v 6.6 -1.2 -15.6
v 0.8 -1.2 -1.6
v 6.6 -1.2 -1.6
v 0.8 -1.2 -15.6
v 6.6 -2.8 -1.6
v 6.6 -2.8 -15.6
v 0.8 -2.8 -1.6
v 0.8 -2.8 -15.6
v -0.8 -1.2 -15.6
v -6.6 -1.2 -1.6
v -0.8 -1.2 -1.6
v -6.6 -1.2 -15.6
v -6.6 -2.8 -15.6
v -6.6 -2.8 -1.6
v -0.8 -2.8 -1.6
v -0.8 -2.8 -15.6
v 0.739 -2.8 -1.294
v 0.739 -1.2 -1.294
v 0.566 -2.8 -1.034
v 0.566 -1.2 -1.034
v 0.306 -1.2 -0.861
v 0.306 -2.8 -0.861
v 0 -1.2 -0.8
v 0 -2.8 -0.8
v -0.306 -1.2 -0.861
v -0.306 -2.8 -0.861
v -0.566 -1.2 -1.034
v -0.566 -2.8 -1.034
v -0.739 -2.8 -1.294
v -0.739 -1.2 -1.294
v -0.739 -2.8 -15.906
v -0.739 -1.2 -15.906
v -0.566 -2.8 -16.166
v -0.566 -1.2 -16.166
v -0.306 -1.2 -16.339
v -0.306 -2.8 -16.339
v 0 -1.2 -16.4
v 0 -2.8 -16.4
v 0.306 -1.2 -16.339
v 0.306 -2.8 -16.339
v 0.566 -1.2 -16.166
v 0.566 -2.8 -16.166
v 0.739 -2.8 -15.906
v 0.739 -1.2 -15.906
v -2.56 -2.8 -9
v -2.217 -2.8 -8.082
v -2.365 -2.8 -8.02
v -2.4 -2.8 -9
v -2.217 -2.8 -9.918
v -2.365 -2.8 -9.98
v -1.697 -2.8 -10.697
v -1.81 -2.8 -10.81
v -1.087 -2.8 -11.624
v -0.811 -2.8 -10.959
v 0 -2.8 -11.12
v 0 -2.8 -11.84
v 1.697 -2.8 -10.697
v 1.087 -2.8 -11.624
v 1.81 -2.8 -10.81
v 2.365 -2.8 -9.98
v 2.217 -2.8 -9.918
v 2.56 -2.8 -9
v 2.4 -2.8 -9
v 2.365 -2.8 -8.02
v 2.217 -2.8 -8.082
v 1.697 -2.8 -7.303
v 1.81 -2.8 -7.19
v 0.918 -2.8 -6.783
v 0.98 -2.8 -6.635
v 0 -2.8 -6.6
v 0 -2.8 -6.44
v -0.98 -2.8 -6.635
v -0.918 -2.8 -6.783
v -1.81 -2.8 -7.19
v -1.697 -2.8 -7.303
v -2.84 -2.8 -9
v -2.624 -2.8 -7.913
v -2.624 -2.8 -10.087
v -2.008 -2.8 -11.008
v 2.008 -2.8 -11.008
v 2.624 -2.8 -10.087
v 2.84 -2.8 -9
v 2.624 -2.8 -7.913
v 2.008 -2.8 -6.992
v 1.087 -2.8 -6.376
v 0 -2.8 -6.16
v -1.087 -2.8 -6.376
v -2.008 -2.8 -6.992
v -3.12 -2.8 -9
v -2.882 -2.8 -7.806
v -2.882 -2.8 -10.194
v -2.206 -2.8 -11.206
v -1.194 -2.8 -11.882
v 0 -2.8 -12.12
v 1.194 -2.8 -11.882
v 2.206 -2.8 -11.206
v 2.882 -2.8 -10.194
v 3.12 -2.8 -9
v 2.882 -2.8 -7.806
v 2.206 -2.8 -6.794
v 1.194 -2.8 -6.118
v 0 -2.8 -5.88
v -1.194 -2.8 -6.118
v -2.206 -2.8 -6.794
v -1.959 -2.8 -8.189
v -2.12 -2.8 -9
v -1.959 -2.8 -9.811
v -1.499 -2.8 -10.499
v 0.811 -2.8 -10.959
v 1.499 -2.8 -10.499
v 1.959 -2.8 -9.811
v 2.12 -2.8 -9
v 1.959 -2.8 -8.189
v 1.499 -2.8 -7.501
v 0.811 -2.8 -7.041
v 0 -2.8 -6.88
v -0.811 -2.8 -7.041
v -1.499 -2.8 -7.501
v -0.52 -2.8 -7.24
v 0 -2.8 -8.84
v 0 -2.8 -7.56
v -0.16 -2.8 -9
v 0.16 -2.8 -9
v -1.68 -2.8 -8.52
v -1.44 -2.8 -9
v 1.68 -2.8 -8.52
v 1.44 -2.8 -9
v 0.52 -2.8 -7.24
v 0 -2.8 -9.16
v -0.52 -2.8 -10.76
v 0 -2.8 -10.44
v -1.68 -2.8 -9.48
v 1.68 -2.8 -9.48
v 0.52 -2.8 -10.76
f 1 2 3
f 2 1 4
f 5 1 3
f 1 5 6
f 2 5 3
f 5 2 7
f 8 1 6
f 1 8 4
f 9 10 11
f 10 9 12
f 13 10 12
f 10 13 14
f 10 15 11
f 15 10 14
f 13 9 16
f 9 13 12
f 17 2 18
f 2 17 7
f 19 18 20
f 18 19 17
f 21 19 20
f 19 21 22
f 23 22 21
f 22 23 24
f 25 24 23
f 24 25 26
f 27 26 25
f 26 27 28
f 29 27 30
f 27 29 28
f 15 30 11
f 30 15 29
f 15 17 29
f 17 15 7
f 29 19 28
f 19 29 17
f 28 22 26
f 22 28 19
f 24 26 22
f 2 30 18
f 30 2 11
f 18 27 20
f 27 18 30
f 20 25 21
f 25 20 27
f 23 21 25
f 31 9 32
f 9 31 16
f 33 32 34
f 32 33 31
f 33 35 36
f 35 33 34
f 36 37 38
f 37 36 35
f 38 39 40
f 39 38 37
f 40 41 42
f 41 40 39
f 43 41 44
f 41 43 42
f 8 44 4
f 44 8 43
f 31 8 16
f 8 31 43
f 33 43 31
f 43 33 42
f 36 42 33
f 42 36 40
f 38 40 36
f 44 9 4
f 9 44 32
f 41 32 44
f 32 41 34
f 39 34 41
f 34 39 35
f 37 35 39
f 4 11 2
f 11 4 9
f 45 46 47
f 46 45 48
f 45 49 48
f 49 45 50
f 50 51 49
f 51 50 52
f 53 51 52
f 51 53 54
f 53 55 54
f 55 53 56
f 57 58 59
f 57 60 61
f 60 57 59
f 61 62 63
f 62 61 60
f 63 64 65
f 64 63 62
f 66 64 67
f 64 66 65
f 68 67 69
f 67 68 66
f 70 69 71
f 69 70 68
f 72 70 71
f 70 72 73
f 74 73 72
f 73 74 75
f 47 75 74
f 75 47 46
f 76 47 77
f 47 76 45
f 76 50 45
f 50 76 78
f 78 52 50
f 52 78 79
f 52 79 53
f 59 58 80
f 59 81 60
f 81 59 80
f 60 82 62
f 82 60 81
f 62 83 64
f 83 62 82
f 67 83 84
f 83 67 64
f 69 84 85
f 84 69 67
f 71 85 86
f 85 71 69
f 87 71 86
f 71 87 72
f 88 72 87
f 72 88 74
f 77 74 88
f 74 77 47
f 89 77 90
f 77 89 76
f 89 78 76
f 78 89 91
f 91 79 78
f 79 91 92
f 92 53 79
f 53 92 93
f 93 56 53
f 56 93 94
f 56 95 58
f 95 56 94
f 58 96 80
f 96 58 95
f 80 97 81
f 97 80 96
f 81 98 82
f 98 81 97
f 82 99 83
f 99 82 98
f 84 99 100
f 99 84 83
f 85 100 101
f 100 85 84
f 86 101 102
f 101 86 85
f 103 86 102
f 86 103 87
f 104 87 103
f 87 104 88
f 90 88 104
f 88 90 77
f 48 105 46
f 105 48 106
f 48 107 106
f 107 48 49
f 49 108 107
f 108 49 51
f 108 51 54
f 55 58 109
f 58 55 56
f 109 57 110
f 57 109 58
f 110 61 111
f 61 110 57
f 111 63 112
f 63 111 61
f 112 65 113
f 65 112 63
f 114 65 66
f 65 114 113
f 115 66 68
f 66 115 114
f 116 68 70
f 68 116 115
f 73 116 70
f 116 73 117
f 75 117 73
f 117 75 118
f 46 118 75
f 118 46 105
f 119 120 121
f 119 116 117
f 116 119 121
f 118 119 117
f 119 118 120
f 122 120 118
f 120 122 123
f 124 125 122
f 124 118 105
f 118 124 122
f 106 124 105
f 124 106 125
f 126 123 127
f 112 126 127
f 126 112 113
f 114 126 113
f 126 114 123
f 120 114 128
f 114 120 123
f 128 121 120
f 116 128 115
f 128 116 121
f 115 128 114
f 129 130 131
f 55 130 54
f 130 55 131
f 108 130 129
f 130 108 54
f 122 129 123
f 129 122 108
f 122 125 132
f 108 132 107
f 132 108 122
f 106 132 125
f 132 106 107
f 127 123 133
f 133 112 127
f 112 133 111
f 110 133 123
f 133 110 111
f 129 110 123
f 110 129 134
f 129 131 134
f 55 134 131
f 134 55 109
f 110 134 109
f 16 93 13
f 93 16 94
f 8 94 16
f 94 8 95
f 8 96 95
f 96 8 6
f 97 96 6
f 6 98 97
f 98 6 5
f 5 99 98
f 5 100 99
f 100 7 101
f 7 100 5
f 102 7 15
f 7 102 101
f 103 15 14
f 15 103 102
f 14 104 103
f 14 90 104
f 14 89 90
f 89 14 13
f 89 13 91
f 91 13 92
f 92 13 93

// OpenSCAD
// file: ../p/2-4edge.scad
use <../lib.scad>
function ldraw_lib__2_4edge() = [
// 0 Circle 0.5
// 0 Name: 2-4edge.dat
// 0 Author: James Jessiman
// 0 !LDRAW_ORG Primitive UPDATE 2017-01
// 0 !LICENSE Licensed under CC BY 4.0 : see CAreadme.txt
// 
// 0 BFC CERTIFY CCW
  [0,"BFC","CERTIFY"],
  [0,"BFC","CCW"],
// 
// 0 !HISTORY 2007-06-24 [PTadmin] Header formatted for Contributor Agreement
// 0 !HISTORY 2008-07-01 [PTadmin] Official Update 2008-01
// 0 !HISTORY 2017-01-15 [Steffen] BFCed
// 0 !HISTORY 2017-12-30 [PTadmin] Official Update 2017-01
// 
// 
// 2 24 1 0 0 0.9239 0 0.3827
  [2,24,1,0,0,0.9239,0,0.3827],
// 2 24 0.9239 0 0.3827 0.7071 0 0.7071
  [2,24,0.9239,0,0.3827,0.7071,0,0.7071],
// 2 24 0.7071 0 0.7071 0.3827 0 0.9239
  [2,24,0.7071,0,0.7071,0.3827,0,0.9239],
// 2 24 0.3827 0 0.9239 0 0 1
  [2,24,0.3827,0,0.9239,0,0,1],
// 2 24 0 0 1 -0.3827 0 0.9239
  [2,24,0,0,1,-0.3827,0,0.9239],
// 2 24 -0.3827 0 0.9239 -0.7071 0 0.7071
  [2,24,-0.3827,0,0.9239,-0.7071,0,0.7071],
// 2 24 -0.7071 0 0.7071 -0.9239 0 0.3827
  [2,24,-0.7071,0,0.7071,-0.9239,0,0.3827],
// 2 24 -0.9239 0 0.3827 -1 0 0
  [2,24,-0.9239,0,0.3827,-1,0,0],
];
module ldraw_lib__2_4edge(step=0, col=false, unit=2/5, alt=false, line=0.2, solid=!$preview)
    makepoly(ldraw_lib__2_4edge(), step=step, col=col, unit=unit, alt=alt, line=line, solid=solid);
ldraw_lib__2_4edge(line=0.2);
// file: ../p/2-4cyli.scad
use <../lib.scad>
function ldraw_lib__2_4cyli() = [
// 0 Cylinder 0.5
// 0 Name: 2-4cyli.dat
// 0 Author: James Jessiman
// 0 !LDRAW_ORG Primitive UPDATE 2005-01
// 0 !LICENSE Licensed under CC BY 2.0 and CC BY 4.0 : see CAreadme.txt
// 
// 0 BFC CERTIFY CCW
  [0,"BFC","CERTIFY"],
  [0,"BFC","CCW"],
// 
// 0 !HISTORY 2002-03-23 [sbliss] Added BFC statement; compacted code
// 0 !HISTORY 2002-04-25 [PTadmin] Official Update 2002-02
// 0 !HISTORY 2004-12-11 [nielsk] Recreated using Primitive Generator, Edge lines fixed, BFC changed to CCW
// 0 !HISTORY 2005-12-28 [PTadmin] Official Update 2005-01
// 0 !HISTORY 2007-06-24 [PTadmin] Header formatted for Contributor Agreement
// 0 !HISTORY 2008-07-01 [PTadmin] Official Update 2008-01
// 
// 
// 4 16 .9239 1 .3827 .9239 0 .3827 1 0 0 1 1 0
  [4,16,.9239,1,.3827,.9239,0,.3827,1,0,0,1,1,0],
// 4 16 .7071 1 .7071 .7071 0 .7071 .9239 0 .3827 .9239 1 .3827
  [4,16,.7071,1,.7071,.7071,0,.7071,.9239,0,.3827,.9239,1,.3827],
// 4 16 .3827 1 .9239 .3827 0 .9239 .7071 0 .7071 .7071 1 .7071
  [4,16,.3827,1,.9239,.3827,0,.9239,.7071,0,.7071,.7071,1,.7071],
// 4 16 0 1 1 0 0 1 .3827 0 .9239 .3827 1 .9239
  [4,16,0,1,1,0,0,1,.3827,0,.9239,.3827,1,.9239],
// 4 16 -.3827 1 .9239 -.3827 0 .9239 0 0 1 0 1 1
  [4,16,-.3827,1,.9239,-.3827,0,.9239,0,0,1,0,1,1],
// 4 16 -.7071 1 .7071 -.7071 0 .7071 -.3827 0 .9239 -.3827 1 .9239
  [4,16,-.7071,1,.7071,-.7071,0,.7071,-.3827,0,.9239,-.3827,1,.9239],
// 4 16 -.9239 1 .3827 -.9239 0 .3827 -.7071 0 .7071 -.7071 1 .7071
  [4,16,-.9239,1,.3827,-.9239,0,.3827,-.7071,0,.7071,-.7071,1,.7071],
// 4 16 -1 1 0 -1 0 0 -.9239 0 .3827 -.9239 1 .3827
  [4,16,-1,1,0,-1,0,0,-.9239,0,.3827,-.9239,1,.3827],
// 5 24 1 1 0 1 0 0 1 1 -.4142 .9239 1 .3827
  [5,24,1,1,0,1,0,0,1,1,-.4142,.9239,1,.3827],
// 5 24 .9239 1 .3827 .9239 0 .3827 1 1 0 .7071 1 .7071
  [5,24,.9239,1,.3827,.9239,0,.3827,1,1,0,.7071,1,.7071],
// 5 24 .7071 1 .7071 .7071 0 .7071 .9239 1 .3827 .3827 1 .9239
  [5,24,.7071,1,.7071,.7071,0,.7071,.9239,1,.3827,.3827,1,.9239],
// 5 24 .3827 1 .9239 .3827 0 .9239 .7071 1 .7071 0 1 1
  [5,24,.3827,1,.9239,.3827,0,.9239,.7071,1,.7071,0,1,1],
// 5 24 0 1 1 0 0 1 .3827 1 .9239 -.3827 1 .9239
  [5,24,0,1,1,0,0,1,.3827,1,.9239,-.3827,1,.9239],
// 5 24 -.3827 1 .9239 -.3827 0 .9239 0 1 1 -.7071 1 .7071
  [5,24,-.3827,1,.9239,-.3827,0,.9239,0,1,1,-.7071,1,.7071],
// 5 24 -.7071 1 .7071 -.7071 0 .7071 -.3827 1 .9239 -.9239 1 .3827
  [5,24,-.7071,1,.7071,-.7071,0,.7071,-.3827,1,.9239,-.9239,1,.3827],
// 5 24 -.9239 1 .3827 -.9239 0 .3827 -.7071 1 .7071 -1 1 0
  [5,24,-.9239,1,.3827,-.9239,0,.3827,-.7071,1,.7071,-1,1,0],
// 5 24 -1 1 0 -1 0 0 -.9239 1 .3827 -1 1 -.4142
  [5,24,-1,1,0,-1,0,0,-.9239,1,.3827,-1,1,-.4142],
// 0
];
module ldraw_lib__2_4cyli(step=0, col=false, unit=2/5, alt=false, line=0.2, solid=!$preview)
    makepoly(ldraw_lib__2_4cyli(), step=step, col=col, unit=unit, alt=alt, line=line, solid=solid);
ldraw_lib__2_4cyli(line=0.2);
// file: ../p/box4-4a.scad
use <../lib.scad>
function ldraw_lib__box4_4a() = [
// 0 Box with 4 Faces without 4 Adjacent Edges
// 0 Name: box4-4a.dat
// 0 Author: Manfred Moolhuysen
// 0 !LDRAW_ORG Primitive UPDATE 2012-01
// 0 !LICENSE Licensed under CC BY 2.0 and CC BY 4.0 : see CAreadme.txt
// 
// 0 BFC CERTIFY CCW
  [0,"BFC","CERTIFY"],
  [0,"BFC","CCW"],
// 
// 0 !HISTORY 1998-07-15 [PTadmin] Official Update 1998-07
// 0 !HISTORY 2002-12-13 [hafhead] Made BFC compliant
// 0 !HISTORY 2003-03-12 [PTadmin] Official Update 2003-01
// 0 !HISTORY 2007-06-24 [PTadmin] Header formatted for Contributor Agreement
// 0 !HISTORY 2008-07-01 [PTadmin] Official Update 2008-01
// 0 !HISTORY 2012-02-16 [Philo] Changed to CCW
// 0 !HISTORY 2012-03-30 [PTadmin] Official Update 2012-01
// 
// 
// 2 24 1 1 1 -1 1 1
  [2,24,1,1,1,-1,1,1],
// 2 24 -1 1 1 -1 1 -1
  [2,24,-1,1,1,-1,1,-1],
// 2 24 1 1 -1 1 1 1
  [2,24,1,1,-1,1,1,1],
// 2 24 1 0 1 -1 0 1
  [2,24,1,0,1,-1,0,1],
// 2 24 -1 0 1 -1 0 -1
  [2,24,-1,0,1,-1,0,-1],
// 2 24 1 0 -1 1 0 1
  [2,24,1,0,-1,1,0,1],
// 2 24 1 0 1 1 1 1
  [2,24,1,0,1,1,1,1],
// 2 24 -1 0 1 -1 1 1
  [2,24,-1,0,1,-1,1,1],
// 4 16 1 1 -1 -1 1 -1 -1 1 1 1 1 1
  [4,16,1,1,-1,-1,1,-1,-1,1,1,1,1,1],
// 4 16 -1 1 1 -1 0 1 1 0 1 1 1 1
  [4,16,-1,1,1,-1,0,1,1,0,1,1,1,1],
// 4 16 -1 1 -1 -1 0 -1 -1 0 1 -1 1 1
  [4,16,-1,1,-1,-1,0,-1,-1,0,1,-1,1,1],
// 4 16 1 1 1 1 0 1 1 0 -1 1 1 -1
  [4,16,1,1,1,1,0,1,1,0,-1,1,1,-1],
];
module ldraw_lib__box4_4a(step=0, col=false, unit=2/5, alt=false, line=0.2, solid=!$preview)
    makepoly(ldraw_lib__box4_4a(), step=step, col=col, unit=unit, alt=alt, line=line, solid=solid);
ldraw_lib__box4_4a(line=0.2);
// file: ../p/2-4cylo.scad
use <../lib.scad>
use <2-4cyli.scad>
use <2-4edge.scad>
function ldraw_lib__2_4cylo() = [
// 0 Cylinder Open 0.5
// 0 Name: 2-4cylo.dat
// 0 Author: Max Martin Richter [MMR1988]
// 0 !LDRAW_ORG Primitive UPDATE 2010-03
// 0 !LICENSE Licensed under CC BY 4.0 : see CAreadme.txt
// 
// 0 BFC CERTIFY CCW
  [0,"BFC","CERTIFY"],
  [0,"BFC","CCW"],
// 
// 0 !HISTORY 2010-12-31 [PTadmin] Official Update 2010-03
// 
// 
// 1 16 0 0 0 1 0 0 0 1 0 0 0 1 2-4edge.dat
  [1,16,0,0,0,1,0,0,0,1,0,0,0,1, ldraw_lib__2_4edge()],
// 1 16 0 1 0 1 0 0 0 1 0 0 0 1 2-4edge.dat
  [1,16,0,1,0,1,0,0,0,1,0,0,0,1, ldraw_lib__2_4edge()],
// 1 16 0 0 0 1 0 0 0 1 0 0 0 1 2-4cyli.dat
  [1,16,0,0,0,1,0,0,0,1,0,0,0,1, ldraw_lib__2_4cyli()],
];
module ldraw_lib__2_4cylo(step=0, col=false, unit=2/5, alt=false, line=0.2, solid=!$preview)
    makepoly(ldraw_lib__2_4cylo(), step=step, col=col, unit=unit, alt=alt, line=line, solid=solid);
ldraw_lib__2_4cylo(line=0.2);
// file: ../p/2-4chrd.scad
use <../lib.scad>
function ldraw_lib__2_4chrd() = [
// 0 Chord 0.5
// 0 Name: 2-4chrd.dat
// 0 Author: Philippe Hurbain [Philo]
// 0 !LDRAW_ORG Primitive UPDATE 2014-01
// 0 !LICENSE Licensed under CC BY 4.0 : see CAreadme.txt
// 
// 0 BFC CERTIFY CCW
  [0,"BFC","CERTIFY"],
  [0,"BFC","CCW"],
// 
// 0 !HISTORY 2014-06-21 [PTadmin] Official Update 2014-01
// 
// 
// 4 16 0.9239 0 0.3827 -0.9239 0 0.3827 -1 0 0 1 0 0
  [4,16,0.9239,0,0.3827,-0.9239,0,0.3827,-1,0,0,1,0,0],
// 4 16 0.7071 0 0.7071 -0.7071 0 0.7071 -0.9239 0 0.3827 0.9239 0 0.3827
  [4,16,0.7071,0,0.7071,-0.7071,0,0.7071,-0.9239,0,0.3827,0.9239,0,0.3827],
// 4 16 0.3827 0 0.9239 -0.3827 0 0.9239 -0.7071 0 0.7071 0.7071 0 0.7071
  [4,16,0.3827,0,0.9239,-0.3827,0,0.9239,-0.7071,0,0.7071,0.7071,0,0.7071],
// 3 16 0 0 1 -0.3827 0 0.9239 0.3827 0 0.9239
  [3,16,0,0,1,-0.3827,0,0.9239,0.3827,0,0.9239],
];
module ldraw_lib__2_4chrd(step=0, col=false, unit=2/5, alt=false, line=0.2, solid=!$preview)
    makepoly(ldraw_lib__2_4chrd(), step=step, col=col, unit=unit, alt=alt, line=line, solid=solid);
ldraw_lib__2_4chrd(line=0.2);
// file: s/60601s01.scad
use <../../lib.scad>
use <../../p/2-4chrd.scad>
use <../../p/2-4cylo.scad>
use <../../p/box4-4a.scad>
function ldraw_lib__s__60601s01() = [
// 0 ~Glass for Window  1 x  2 x  2 without Front Surface
// 0 Name: s\60601s01.dat
// 0 Author: Ulrich Röder [UR]
// 0 !LDRAW_ORG Subpart UPDATE 2019-01
// 0 !LICENSE Licensed under CC BY 4.0 : see CAreadme.txt
// 
// 0 BFC CERTIFY CCW
  [0,"BFC","CERTIFY"],
  [0,"BFC","CCW"],
// 
// 0 !HISTORY 2019-06-28 [PTadmin] Official Update 2019-01
// 
// 
// 1 16 9.25 21.5 -7 0 0 7.25 17.5 0 0 0 4 0 box4-4a.dat
  [1,16,9.25,21.5,-7,0,0,7.25,17.5,0,0,0,4,0, ldraw_lib__box4_4a()],
// 1 16 -9.25 21.5 -7 0 0 -7.25 17.5 0 0 0 4 0 box4-4a.dat
  [1,16,-9.25,21.5,-7,0,0,-7.25,17.5,0,0,0,4,0, ldraw_lib__box4_4a()],
// 1 16 0 4 -7 2 0 0 0 0 -2 0 4 0 2-4cylo.dat
  [1,16,0,4,-7,2,0,0,0,0,-2,0,4,0, ldraw_lib__2_4cylo()],
// 1 16 0 4 -7 2 0 0 0 0 -2 0 1 0 2-4chrd.dat
  [1,16,0,4,-7,2,0,0,0,0,-2,0,1,0, ldraw_lib__2_4chrd()],
// 1 16 0 4 -3 -2 0 0 0 0 -2 0 -1 0 2-4chrd.dat
  [1,16,0,4,-3,-2,0,0,0,0,-2,0,-1,0, ldraw_lib__2_4chrd()],
// 1 16 0 39 -7 -2 0 0 0 0 2 0 4 0 2-4cylo.dat
  [1,16,0,39,-7,-2,0,0,0,0,2,0,4,0, ldraw_lib__2_4cylo()],
// 1 16 0 39 -7 -2 0 0 0 0 2 0 1 0 2-4chrd.dat
  [1,16,0,39,-7,-2,0,0,0,0,2,0,1,0, ldraw_lib__2_4chrd()],
// 1 16 0 39 -3 2 0 0 0 0 2 0 -1 0 2-4chrd.dat
  [1,16,0,39,-3,2,0,0,0,0,2,0,-1,0, ldraw_lib__2_4chrd()],
// 4 16 -2 4 -3 2 4 -3 2 39 -3 -2 39 -3
  [4,16,-2,4,-3,2,4,-3,2,39,-3,-2,39,-3],
// 2 24 2 4 -3 2 4 -7
  [2,24,2,4,-3,2,4,-7],
// 2 24 -2 4 -3 -2 4 -7
  [2,24,-2,4,-3,-2,4,-7],
// 2 24 2 39 -3 2 39 -7
  [2,24,2,39,-3,2,39,-7],
// 2 24 -2 39 -3 -2 39 -7
  [2,24,-2,39,-3,-2,39,-7],
];
module ldraw_lib__s__60601s01(step=0, col=false, unit=2/5, alt=false, line=0.2, solid=!$preview)
    makepoly(ldraw_lib__s__60601s01(), step=step, col=col, unit=unit, alt=alt, line=line, solid=solid);
ldraw_lib__s__60601s01(line=0.2);
// main file
use <../lib.scad>
use <s/60601s01.scad>
function ldraw_lib__60601p02() = [
// 0 Glass for Window  1 x  2 x  2 with Black and White St. John Ambulance Logo Pattern
// 0 Name: 60601p02.dat
// 0 Author: Gerald Lasser [GeraldLasser]
// 0 !LDRAW_ORG Part UPDATE 2020-01
// 0 !LICENSE Licensed under CC BY 4.0 : see CAreadme.txt
// 
// 0 BFC CERTIFY CCW
  [0,"BFC","CERTIFY"],
  [0,"BFC","CCW"],
// 
// 0 !KEYWORDS Bricklink 60601pb011, Dr. Who, Set 21304, Tardis
// 
// 0 !HISTORY 2020-06-28 [PTadmin] Official Update 2020-01
// 
// 
// 1 16 0 0 0 1 0 0 0 1 0 0 0 1 s\60601s01.dat
  [1,16,0,0,0,1,0,0,0,1,0,0,0,1, ldraw_lib__s__60601s01()],
// 
// 4 0 -6 22.5 -7 -5.543 20.204 -7 -5.913 20.051 -7 -6.4 22.5 -7
  [4,0,-6,22.5,-7,-5.543,20.204,-7,-5.913,20.051,-7,-6.4,22.5,-7],
// 4 0 -5.543 24.796 -7 -6 22.5 -7 -6.4 22.5 -7 -5.913 24.949 -7
  [4,0,-5.543,24.796,-7,-6,22.5,-7,-6.4,22.5,-7,-5.913,24.949,-7],
// 4 0 -4.243 26.743 -7 -5.543 24.796 -7 -5.913 24.949 -7 -4.525 27.025 -7
  [4,0,-4.243,26.743,-7,-5.543,24.796,-7,-5.913,24.949,-7,-4.525,27.025,-7],
// 4 15 -2.028 27.397 -7 -4.243 26.743 -7 -4.525 27.025 -7 -2.717 29.06 -7
  [4,15,-2.028,27.397,-7,-4.243,26.743,-7,-4.525,27.025,-7,-2.717,29.06,-7],
// 4 15 -2.028 27.397 -7 -2.717 29.06 -7 0 29.6 -7 0 27.8 -7
  [4,15,-2.028,27.397,-7,-2.717,29.06,-7,0,29.6,-7,0,27.8,-7],
// 3 15 4.243 26.743 -7 2.717 29.06 -7 4.525 27.025 -7
  [3,15,4.243,26.743,-7,2.717,29.06,-7,4.525,27.025,-7],
// 4 0 5.543 24.796 -7 4.243 26.743 -7 4.525 27.025 -7 5.913 24.949 -7
  [4,0,5.543,24.796,-7,4.243,26.743,-7,4.525,27.025,-7,5.913,24.949,-7],
// 4 0 6 22.5 -7 5.543 24.796 -7 5.913 24.949 -7 6.4 22.5 -7
  [4,0,6,22.5,-7,5.543,24.796,-7,5.913,24.949,-7,6.4,22.5,-7],
// 4 0 5.543 20.204 -7 6 22.5 -7 6.4 22.5 -7 5.913 20.051 -7
  [4,0,5.543,20.204,-7,6,22.5,-7,6.4,22.5,-7,5.913,20.051,-7],
// 4 0 4.243 18.257 -7 5.543 20.204 -7 5.913 20.051 -7 4.525 17.975 -7
  [4,0,4.243,18.257,-7,5.543,20.204,-7,5.913,20.051,-7,4.525,17.975,-7],
// 4 0 2.296 16.957 -7 4.243 18.257 -7 4.525 17.975 -7 2.449 16.587 -7
  [4,0,2.296,16.957,-7,4.243,18.257,-7,4.525,17.975,-7,2.449,16.587,-7],
// 4 0 0 16.5 -7 2.296 16.957 -7 2.449 16.587 -7 0 16.1 -7
  [4,0,0,16.5,-7,2.296,16.957,-7,2.449,16.587,-7,0,16.1,-7],
// 4 0 -2.296 16.957 -7 0 16.5 -7 0 16.1 -7 -2.449 16.587 -7
  [4,0,-2.296,16.957,-7,0,16.5,-7,0,16.1,-7,-2.449,16.587,-7],
// 4 0 -4.243 18.257 -7 -2.296 16.957 -7 -2.449 16.587 -7 -4.525 17.975 -7
  [4,0,-4.243,18.257,-7,-2.296,16.957,-7,-2.449,16.587,-7,-4.525,17.975,-7],
// 4 0 -5.543 20.204 -7 -4.243 18.257 -7 -4.525 17.975 -7 -5.913 20.051 -7
  [4,0,-5.543,20.204,-7,-4.243,18.257,-7,-4.525,17.975,-7,-5.913,20.051,-7],
// 4 15 -6.4 22.5 -7 -5.913 20.051 -7 -6.56 19.783 -7 -7.1 22.5 -7
  [4,15,-6.4,22.5,-7,-5.913,20.051,-7,-6.56,19.783,-7,-7.1,22.5,-7],
// 4 15 -5.913 24.949 -7 -6.4 22.5 -7 -7.1 22.5 -7 -6.56 25.217 -7
  [4,15,-5.913,24.949,-7,-6.4,22.5,-7,-7.1,22.5,-7,-6.56,25.217,-7],
// 4 15 -4.525 27.025 -7 -5.913 24.949 -7 -6.56 25.217 -7 -5.02 27.52 -7
  [4,15,-4.525,27.025,-7,-5.913,24.949,-7,-6.56,25.217,-7,-5.02,27.52,-7],
// 3 15 -4.525 27.025 -7 -5.02 27.52 -7 -2.717 29.06 -7
  [3,15,-4.525,27.025,-7,-5.02,27.52,-7,-2.717,29.06,-7],
// 3 15 4.525 27.025 -7 2.717 29.06 -7 5.02 27.52 -7
  [3,15,4.525,27.025,-7,2.717,29.06,-7,5.02,27.52,-7],
// 4 15 5.913 24.949 -7 4.525 27.025 -7 5.02 27.52 -7 6.56 25.217 -7
  [4,15,5.913,24.949,-7,4.525,27.025,-7,5.02,27.52,-7,6.56,25.217,-7],
// 4 15 6.4 22.5 -7 5.913 24.949 -7 6.56 25.217 -7 7.1 22.5 -7
  [4,15,6.4,22.5,-7,5.913,24.949,-7,6.56,25.217,-7,7.1,22.5,-7],
// 4 15 5.913 20.051 -7 6.4 22.5 -7 7.1 22.5 -7 6.56 19.783 -7
  [4,15,5.913,20.051,-7,6.4,22.5,-7,7.1,22.5,-7,6.56,19.783,-7],
// 4 15 4.525 17.975 -7 5.913 20.051 -7 6.56 19.783 -7 5.02 17.48 -7
  [4,15,4.525,17.975,-7,5.913,20.051,-7,6.56,19.783,-7,5.02,17.48,-7],
// 4 15 2.449 16.587 -7 4.525 17.975 -7 5.02 17.48 -7 2.717 15.94 -7
  [4,15,2.449,16.587,-7,4.525,17.975,-7,5.02,17.48,-7,2.717,15.94,-7],
// 4 15 0 16.1 -7 2.449 16.587 -7 2.717 15.94 -7 0 15.4 -7
  [4,15,0,16.1,-7,2.449,16.587,-7,2.717,15.94,-7,0,15.4,-7],
// 4 15 -2.449 16.587 -7 0 16.1 -7 0 15.4 -7 -2.717 15.94 -7
  [4,15,-2.449,16.587,-7,0,16.1,-7,0,15.4,-7,-2.717,15.94,-7],
// 4 15 -4.525 17.975 -7 -2.449 16.587 -7 -2.717 15.94 -7 -5.02 17.48 -7
  [4,15,-4.525,17.975,-7,-2.449,16.587,-7,-2.717,15.94,-7,-5.02,17.48,-7],
// 4 15 -5.913 20.051 -7 -4.525 17.975 -7 -5.02 17.48 -7 -6.56 19.783 -7
  [4,15,-5.913,20.051,-7,-4.525,17.975,-7,-5.02,17.48,-7,-6.56,19.783,-7],
// 4 0 -7.1 22.5 -7 -6.56 19.783 -7 -7.206 19.515 -7 -7.8 22.5 -7
  [4,0,-7.1,22.5,-7,-6.56,19.783,-7,-7.206,19.515,-7,-7.8,22.5,-7],
// 4 0 -6.56 25.217 -7 -7.1 22.5 -7 -7.8 22.5 -7 -7.206 25.485 -7
  [4,0,-6.56,25.217,-7,-7.1,22.5,-7,-7.8,22.5,-7,-7.206,25.485,-7],
// 4 0 -5.02 27.52 -7 -6.56 25.217 -7 -7.206 25.485 -7 -5.515 28.015 -7
  [4,0,-5.02,27.52,-7,-6.56,25.217,-7,-7.206,25.485,-7,-5.515,28.015,-7],
// 4 0 -2.717 29.06 -7 -5.02 27.52 -7 -5.515 28.015 -7 -2.985 29.706 -7
  [4,0,-2.717,29.06,-7,-5.02,27.52,-7,-5.515,28.015,-7,-2.985,29.706,-7],
// 4 0 0 29.6 -7 -2.717 29.06 -7 -2.985 29.706 -7 0 30.3 -7
  [4,0,0,29.6,-7,-2.717,29.06,-7,-2.985,29.706,-7,0,30.3,-7],
// 4 0 2.717 29.06 -7 0 29.6 -7 0 30.3 -7 2.985 29.706 -7
  [4,0,2.717,29.06,-7,0,29.6,-7,0,30.3,-7,2.985,29.706,-7],
// 4 0 5.02 27.52 -7 2.717 29.06 -7 2.985 29.706 -7 5.515 28.015 -7
  [4,0,5.02,27.52,-7,2.717,29.06,-7,2.985,29.706,-7,5.515,28.015,-7],
// 4 0 6.56 25.217 -7 5.02 27.52 -7 5.515 28.015 -7 7.206 25.485 -7
  [4,0,6.56,25.217,-7,5.02,27.52,-7,5.515,28.015,-7,7.206,25.485,-7],
// 4 0 7.1 22.5 -7 6.56 25.217 -7 7.206 25.485 -7 7.8 22.5 -7
  [4,0,7.1,22.5,-7,6.56,25.217,-7,7.206,25.485,-7,7.8,22.5,-7],
// 4 0 6.56 19.783 -7 7.1 22.5 -7 7.8 22.5 -7 7.206 19.515 -7
  [4,0,6.56,19.783,-7,7.1,22.5,-7,7.8,22.5,-7,7.206,19.515,-7],
// 4 0 5.02 17.48 -7 6.56 19.783 -7 7.206 19.515 -7 5.515 16.985 -7
  [4,0,5.02,17.48,-7,6.56,19.783,-7,7.206,19.515,-7,5.515,16.985,-7],
// 4 0 2.717 15.94 -7 5.02 17.48 -7 5.515 16.985 -7 2.985 15.294 -7
  [4,0,2.717,15.94,-7,5.02,17.48,-7,5.515,16.985,-7,2.985,15.294,-7],
// 4 0 0 15.4 -7 2.717 15.94 -7 2.985 15.294 -7 0 14.7 -7
  [4,0,0,15.4,-7,2.717,15.94,-7,2.985,15.294,-7,0,14.7,-7],
// 4 0 -2.717 15.94 -7 0 15.4 -7 0 14.7 -7 -2.985 15.294 -7
  [4,0,-2.717,15.94,-7,0,15.4,-7,0,14.7,-7,-2.985,15.294,-7],
// 4 0 -5.02 17.48 -7 -2.717 15.94 -7 -2.985 15.294 -7 -5.515 16.985 -7
  [4,0,-5.02,17.48,-7,-2.717,15.94,-7,-2.985,15.294,-7,-5.515,16.985,-7],
// 4 0 -6.56 19.783 -7 -5.02 17.48 -7 -5.515 16.985 -7 -7.206 19.515 -7
  [4,0,-6.56,19.783,-7,-5.02,17.48,-7,-5.515,16.985,-7,-7.206,19.515,-7],
// 4 15 -5.3 22.5 -7 -4.897 20.472 -7 -5.543 20.204 -7 -6 22.5 -7
  [4,15,-5.3,22.5,-7,-4.897,20.472,-7,-5.543,20.204,-7,-6,22.5,-7],
// 4 15 -4.897 24.528 -7 -5.3 22.5 -7 -6 22.5 -7 -5.543 24.796 -7
  [4,15,-4.897,24.528,-7,-5.3,22.5,-7,-6,22.5,-7,-5.543,24.796,-7],
// 4 15 -3.748 26.248 -7 -4.897 24.528 -7 -5.543 24.796 -7 -4.243 26.743 -7
  [4,15,-3.748,26.248,-7,-4.897,24.528,-7,-5.543,24.796,-7,-4.243,26.743,-7],
// 3 15 -3.748 26.248 -7 -4.243 26.743 -7 -2.028 27.397 -7
  [3,15,-3.748,26.248,-7,-4.243,26.743,-7,-2.028,27.397,-7],
// 4 15 2.028 27.397 -7 0 27.8 -7 0 29.6 -7 2.717 29.06 -7
  [4,15,2.028,27.397,-7,0,27.8,-7,0,29.6,-7,2.717,29.06,-7],
// 4 15 3.748 26.248 -7 2.028 27.397 -7 2.717 29.06 -7 4.243 26.743 -7
  [4,15,3.748,26.248,-7,2.028,27.397,-7,2.717,29.06,-7,4.243,26.743,-7],
// 4 15 4.897 24.528 -7 3.748 26.248 -7 4.243 26.743 -7 5.543 24.796 -7
  [4,15,4.897,24.528,-7,3.748,26.248,-7,4.243,26.743,-7,5.543,24.796,-7],
// 4 15 5.3 22.5 -7 4.897 24.528 -7 5.543 24.796 -7 6 22.5 -7
  [4,15,5.3,22.5,-7,4.897,24.528,-7,5.543,24.796,-7,6,22.5,-7],
// 4 15 4.897 20.472 -7 5.3 22.5 -7 6 22.5 -7 5.543 20.204 -7
  [4,15,4.897,20.472,-7,5.3,22.5,-7,6,22.5,-7,5.543,20.204,-7],
// 4 15 3.748 18.752 -7 4.897 20.472 -7 5.543 20.204 -7 4.243 18.257 -7
  [4,15,3.748,18.752,-7,4.897,20.472,-7,5.543,20.204,-7,4.243,18.257,-7],
// 4 15 2.028 17.603 -7 3.748 18.752 -7 4.243 18.257 -7 2.296 16.957 -7
  [4,15,2.028,17.603,-7,3.748,18.752,-7,4.243,18.257,-7,2.296,16.957,-7],
// 4 15 0 17.2 -7 2.028 17.603 -7 2.296 16.957 -7 0 16.5 -7
  [4,15,0,17.2,-7,2.028,17.603,-7,2.296,16.957,-7,0,16.5,-7],
// 4 15 -2.028 17.603 -7 0 17.2 -7 0 16.5 -7 -2.296 16.957 -7
  [4,15,-2.028,17.603,-7,0,17.2,-7,0,16.5,-7,-2.296,16.957,-7],
// 4 15 -3.748 18.752 -7 -2.028 17.603 -7 -2.296 16.957 -7 -4.243 18.257 -7
  [4,15,-3.748,18.752,-7,-2.028,17.603,-7,-2.296,16.957,-7,-4.243,18.257,-7],
// 4 15 -4.897 20.472 -7 -3.748 18.752 -7 -4.243 18.257 -7 -5.543 20.204 -7
  [4,15,-4.897,20.472,-7,-3.748,18.752,-7,-4.243,18.257,-7,-5.543,20.204,-7],
// 3 15 -1.3 18.1 -7 0 22.1 -7 0 18.9 -7
  [3,15,-1.3,18.1,-7,0,22.1,-7,0,18.9,-7],
// 4 0 -1.3 18.1 -7 0 18.9 -7 0 17.2 -7 -2.028 17.603 -7
  [4,0,-1.3,18.1,-7,0,18.9,-7,0,17.2,-7,-2.028,17.603,-7],
// 4 0 -1.3 18.1 -7 -2.028 17.603 -7 -3.748 18.752 -7 0 22.1 -7
  [4,0,-1.3,18.1,-7,-2.028,17.603,-7,-3.748,18.752,-7,0,22.1,-7],
// 4 0 0 22.1 -7 -3.748 18.752 -7 -.4 22.5 -7 .4 22.5 -7
  [4,0,0,22.1,-7,-3.748,18.752,-7,-.4,22.5,-7,.4,22.5,-7],
// 3 15 -4.2 21.3 -7 -3.6 22.5 -7 -.4 22.5 -7
  [3,15,-4.2,21.3,-7,-3.6,22.5,-7,-.4,22.5,-7],
// 4 0 -4.897 20.472 -7 -4.2 21.3 -7 -.4 22.5 -7 -3.748 18.752 -7
  [4,0,-4.897,20.472,-7,-4.2,21.3,-7,-.4,22.5,-7,-3.748,18.752,-7],
// 4 0 -4.2 21.3 -7 -4.897 20.472 -7 -5.3 22.5 -7 -3.6 22.5 -7
  [4,0,-4.2,21.3,-7,-4.897,20.472,-7,-5.3,22.5,-7,-3.6,22.5,-7],
// 3 15 4.2 21.3 -7 .4 22.5 -7 3.6 22.5 -7
  [3,15,4.2,21.3,-7,.4,22.5,-7,3.6,22.5,-7],
// 4 0 4.2 21.3 -7 3.6 22.5 -7 5.3 22.5 -7 4.897 20.472 -7
  [4,0,4.2,21.3,-7,3.6,22.5,-7,5.3,22.5,-7,4.897,20.472,-7],
// 4 0 .4 22.5 -7 4.2 21.3 -7 4.897 20.472 -7 3.748 18.752 -7
  [4,0,.4,22.5,-7,4.2,21.3,-7,4.897,20.472,-7,3.748,18.752,-7],
// 4 0 0 22.1 -7 .4 22.5 -7 3.748 18.752 -7 1.3 18.1 -7
  [4,0,0,22.1,-7,.4,22.5,-7,3.748,18.752,-7,1.3,18.1,-7],
// 3 15 1.3 18.1 -7 0 18.9 -7 0 22.1 -7
  [3,15,1.3,18.1,-7,0,18.9,-7,0,22.1,-7],
// 4 0 0 17.2 -7 0 18.9 -7 1.3 18.1 -7 2.028 17.603 -7
  [4,0,0,17.2,-7,0,18.9,-7,1.3,18.1,-7,2.028,17.603,-7],
// 3 0 2.028 17.603 -7 1.3 18.1 -7 3.748 18.752 -7
  [3,0,2.028,17.603,-7,1.3,18.1,-7,3.748,18.752,-7],
// 3 15 0 22.9 -7 -1.3 26.9 -7 0 26.1 -7
  [3,15,0,22.9,-7,-1.3,26.9,-7,0,26.1,-7],
// 4 0 0 27.8 -7 0 26.1 -7 -1.3 26.9 -7 -2.028 27.397 -7
  [4,0,0,27.8,-7,0,26.1,-7,-1.3,26.9,-7,-2.028,27.397,-7],
// 4 0 -3.748 26.248 -7 -2.028 27.397 -7 -1.3 26.9 -7 0 22.9 -7
  [4,0,-3.748,26.248,-7,-2.028,27.397,-7,-1.3,26.9,-7,0,22.9,-7],
// 4 0 -.4 22.5 -7 -3.748 26.248 -7 0 22.9 -7 .4 22.5 -7
  [4,0,-.4,22.5,-7,-3.748,26.248,-7,0,22.9,-7,.4,22.5,-7],
// 3 15 -.4 22.5 -7 -3.6 22.5 -7 -4.2 23.7 -7
  [3,15,-.4,22.5,-7,-3.6,22.5,-7,-4.2,23.7,-7],
// 4 0 -.4 22.5 -7 -4.2 23.7 -7 -4.897 24.528 -7 -3.748 26.248 -7
  [4,0,-.4,22.5,-7,-4.2,23.7,-7,-4.897,24.528,-7,-3.748,26.248,-7],
// 4 0 -5.3 22.5 -7 -4.897 24.528 -7 -4.2 23.7 -7 -3.6 22.5 -7
  [4,0,-5.3,22.5,-7,-4.897,24.528,-7,-4.2,23.7,-7,-3.6,22.5,-7],
// 3 15 3.6 22.5 -7 .4 22.5 -7 4.2 23.7 -7
  [3,15,3.6,22.5,-7,.4,22.5,-7,4.2,23.7,-7],
// 4 0 5.3 22.5 -7 3.6 22.5 -7 4.2 23.7 -7 4.897 24.528 -7
  [4,0,5.3,22.5,-7,3.6,22.5,-7,4.2,23.7,-7,4.897,24.528,-7],
// 4 0 4.897 24.528 -7 4.2 23.7 -7 .4 22.5 -7 3.748 26.248 -7
  [4,0,4.897,24.528,-7,4.2,23.7,-7,.4,22.5,-7,3.748,26.248,-7],
// 4 0 3.748 26.248 -7 .4 22.5 -7 0 22.9 -7 1.3 26.9 -7
  [4,0,3.748,26.248,-7,.4,22.5,-7,0,22.9,-7,1.3,26.9,-7],
// 3 15 0 22.9 -7 0 26.1 -7 1.3 26.9 -7
  [3,15,0,22.9,-7,0,26.1,-7,1.3,26.9,-7],
// 4 0 1.3 26.9 -7 0 26.1 -7 0 27.8 -7 2.028 27.397 -7
  [4,0,1.3,26.9,-7,0,26.1,-7,0,27.8,-7,2.028,27.397,-7],
// 3 0 3.748 26.248 -7 1.3 26.9 -7 2.028 27.397 -7
  [3,0,3.748,26.248,-7,1.3,26.9,-7,2.028,27.397,-7],
// 4 16 -2.985 29.706 -7 -16.5 39 -7 -2 39 -7 0 30.3 -7
  [4,16,-2.985,29.706,-7,-16.5,39,-7,-2,39,-7,0,30.3,-7],
// 4 16 0 30.3 -7 -2 39 -7 2 39 -7 2.985 29.706 -7
  [4,16,0,30.3,-7,-2,39,-7,2,39,-7,2.985,29.706,-7],
// 4 16 2.985 29.706 -7 2 39 -7 16.5 39 -7 5.515 28.015 -7
  [4,16,2.985,29.706,-7,2,39,-7,16.5,39,-7,5.515,28.015,-7],
// 3 16 7.206 25.485 -7 5.515 28.015 -7 16.5 39 -7
  [3,16,7.206,25.485,-7,5.515,28.015,-7,16.5,39,-7],
// 4 16 7.8 22.5 -7 7.206 25.485 -7 16.5 39 -7 16.5 4 -7
  [4,16,7.8,22.5,-7,7.206,25.485,-7,16.5,39,-7,16.5,4,-7],
// 3 16 16.5 4 -7 7.206 19.515 -7 7.8 22.5 -7
  [3,16,16.5,4,-7,7.206,19.515,-7,7.8,22.5,-7],
// 3 16 16.5 4 -7 5.515 16.985 -7 7.206 19.515 -7
  [3,16,16.5,4,-7,5.515,16.985,-7,7.206,19.515,-7],
// 4 16 2.985 15.294 -7 5.515 16.985 -7 16.5 4 -7 2 4 -7
  [4,16,2.985,15.294,-7,5.515,16.985,-7,16.5,4,-7,2,4,-7],
// 4 16 0 14.7 -7 2.985 15.294 -7 2 4 -7 -2 4 -7
  [4,16,0,14.7,-7,2.985,15.294,-7,2,4,-7,-2,4,-7],
// 4 16 -2.985 15.294 -7 0 14.7 -7 -2 4 -7 -16.5 4 -7
  [4,16,-2.985,15.294,-7,0,14.7,-7,-2,4,-7,-16.5,4,-7],
// 3 16 -16.5 4 -7 -5.515 16.985 -7 -2.985 15.294 -7
  [3,16,-16.5,4,-7,-5.515,16.985,-7,-2.985,15.294,-7],
// 3 16 -16.5 4 -7 -7.206 19.515 -7 -5.515 16.985 -7
  [3,16,-16.5,4,-7,-7.206,19.515,-7,-5.515,16.985,-7],
// 4 16 -7.8 22.5 -7 -7.206 19.515 -7 -16.5 4 -7 -16.5 39 -7
  [4,16,-7.8,22.5,-7,-7.206,19.515,-7,-16.5,4,-7,-16.5,39,-7],
// 3 16 -7.8 22.5 -7 -16.5 39 -7 -7.206 25.485 -7
  [3,16,-7.8,22.5,-7,-16.5,39,-7,-7.206,25.485,-7],
// 3 16 -7.206 25.485 -7 -16.5 39 -7 -5.515 28.015 -7
  [3,16,-7.206,25.485,-7,-16.5,39,-7,-5.515,28.015,-7],
// 3 16 -5.515 28.015 -7 -16.5 39 -7 -2.985 29.706 -7
  [3,16,-5.515,28.015,-7,-16.5,39,-7,-2.985,29.706,-7],
];
module ldraw_lib__60601p02(step=0, col=false, unit=2/5, alt=false, line=0.2, solid=!$preview)
    makepoly(ldraw_lib__60601p02(), step=step, col=col, unit=unit, alt=alt, line=line, solid=solid);
ldraw_lib__60601p02(line=0.2);
